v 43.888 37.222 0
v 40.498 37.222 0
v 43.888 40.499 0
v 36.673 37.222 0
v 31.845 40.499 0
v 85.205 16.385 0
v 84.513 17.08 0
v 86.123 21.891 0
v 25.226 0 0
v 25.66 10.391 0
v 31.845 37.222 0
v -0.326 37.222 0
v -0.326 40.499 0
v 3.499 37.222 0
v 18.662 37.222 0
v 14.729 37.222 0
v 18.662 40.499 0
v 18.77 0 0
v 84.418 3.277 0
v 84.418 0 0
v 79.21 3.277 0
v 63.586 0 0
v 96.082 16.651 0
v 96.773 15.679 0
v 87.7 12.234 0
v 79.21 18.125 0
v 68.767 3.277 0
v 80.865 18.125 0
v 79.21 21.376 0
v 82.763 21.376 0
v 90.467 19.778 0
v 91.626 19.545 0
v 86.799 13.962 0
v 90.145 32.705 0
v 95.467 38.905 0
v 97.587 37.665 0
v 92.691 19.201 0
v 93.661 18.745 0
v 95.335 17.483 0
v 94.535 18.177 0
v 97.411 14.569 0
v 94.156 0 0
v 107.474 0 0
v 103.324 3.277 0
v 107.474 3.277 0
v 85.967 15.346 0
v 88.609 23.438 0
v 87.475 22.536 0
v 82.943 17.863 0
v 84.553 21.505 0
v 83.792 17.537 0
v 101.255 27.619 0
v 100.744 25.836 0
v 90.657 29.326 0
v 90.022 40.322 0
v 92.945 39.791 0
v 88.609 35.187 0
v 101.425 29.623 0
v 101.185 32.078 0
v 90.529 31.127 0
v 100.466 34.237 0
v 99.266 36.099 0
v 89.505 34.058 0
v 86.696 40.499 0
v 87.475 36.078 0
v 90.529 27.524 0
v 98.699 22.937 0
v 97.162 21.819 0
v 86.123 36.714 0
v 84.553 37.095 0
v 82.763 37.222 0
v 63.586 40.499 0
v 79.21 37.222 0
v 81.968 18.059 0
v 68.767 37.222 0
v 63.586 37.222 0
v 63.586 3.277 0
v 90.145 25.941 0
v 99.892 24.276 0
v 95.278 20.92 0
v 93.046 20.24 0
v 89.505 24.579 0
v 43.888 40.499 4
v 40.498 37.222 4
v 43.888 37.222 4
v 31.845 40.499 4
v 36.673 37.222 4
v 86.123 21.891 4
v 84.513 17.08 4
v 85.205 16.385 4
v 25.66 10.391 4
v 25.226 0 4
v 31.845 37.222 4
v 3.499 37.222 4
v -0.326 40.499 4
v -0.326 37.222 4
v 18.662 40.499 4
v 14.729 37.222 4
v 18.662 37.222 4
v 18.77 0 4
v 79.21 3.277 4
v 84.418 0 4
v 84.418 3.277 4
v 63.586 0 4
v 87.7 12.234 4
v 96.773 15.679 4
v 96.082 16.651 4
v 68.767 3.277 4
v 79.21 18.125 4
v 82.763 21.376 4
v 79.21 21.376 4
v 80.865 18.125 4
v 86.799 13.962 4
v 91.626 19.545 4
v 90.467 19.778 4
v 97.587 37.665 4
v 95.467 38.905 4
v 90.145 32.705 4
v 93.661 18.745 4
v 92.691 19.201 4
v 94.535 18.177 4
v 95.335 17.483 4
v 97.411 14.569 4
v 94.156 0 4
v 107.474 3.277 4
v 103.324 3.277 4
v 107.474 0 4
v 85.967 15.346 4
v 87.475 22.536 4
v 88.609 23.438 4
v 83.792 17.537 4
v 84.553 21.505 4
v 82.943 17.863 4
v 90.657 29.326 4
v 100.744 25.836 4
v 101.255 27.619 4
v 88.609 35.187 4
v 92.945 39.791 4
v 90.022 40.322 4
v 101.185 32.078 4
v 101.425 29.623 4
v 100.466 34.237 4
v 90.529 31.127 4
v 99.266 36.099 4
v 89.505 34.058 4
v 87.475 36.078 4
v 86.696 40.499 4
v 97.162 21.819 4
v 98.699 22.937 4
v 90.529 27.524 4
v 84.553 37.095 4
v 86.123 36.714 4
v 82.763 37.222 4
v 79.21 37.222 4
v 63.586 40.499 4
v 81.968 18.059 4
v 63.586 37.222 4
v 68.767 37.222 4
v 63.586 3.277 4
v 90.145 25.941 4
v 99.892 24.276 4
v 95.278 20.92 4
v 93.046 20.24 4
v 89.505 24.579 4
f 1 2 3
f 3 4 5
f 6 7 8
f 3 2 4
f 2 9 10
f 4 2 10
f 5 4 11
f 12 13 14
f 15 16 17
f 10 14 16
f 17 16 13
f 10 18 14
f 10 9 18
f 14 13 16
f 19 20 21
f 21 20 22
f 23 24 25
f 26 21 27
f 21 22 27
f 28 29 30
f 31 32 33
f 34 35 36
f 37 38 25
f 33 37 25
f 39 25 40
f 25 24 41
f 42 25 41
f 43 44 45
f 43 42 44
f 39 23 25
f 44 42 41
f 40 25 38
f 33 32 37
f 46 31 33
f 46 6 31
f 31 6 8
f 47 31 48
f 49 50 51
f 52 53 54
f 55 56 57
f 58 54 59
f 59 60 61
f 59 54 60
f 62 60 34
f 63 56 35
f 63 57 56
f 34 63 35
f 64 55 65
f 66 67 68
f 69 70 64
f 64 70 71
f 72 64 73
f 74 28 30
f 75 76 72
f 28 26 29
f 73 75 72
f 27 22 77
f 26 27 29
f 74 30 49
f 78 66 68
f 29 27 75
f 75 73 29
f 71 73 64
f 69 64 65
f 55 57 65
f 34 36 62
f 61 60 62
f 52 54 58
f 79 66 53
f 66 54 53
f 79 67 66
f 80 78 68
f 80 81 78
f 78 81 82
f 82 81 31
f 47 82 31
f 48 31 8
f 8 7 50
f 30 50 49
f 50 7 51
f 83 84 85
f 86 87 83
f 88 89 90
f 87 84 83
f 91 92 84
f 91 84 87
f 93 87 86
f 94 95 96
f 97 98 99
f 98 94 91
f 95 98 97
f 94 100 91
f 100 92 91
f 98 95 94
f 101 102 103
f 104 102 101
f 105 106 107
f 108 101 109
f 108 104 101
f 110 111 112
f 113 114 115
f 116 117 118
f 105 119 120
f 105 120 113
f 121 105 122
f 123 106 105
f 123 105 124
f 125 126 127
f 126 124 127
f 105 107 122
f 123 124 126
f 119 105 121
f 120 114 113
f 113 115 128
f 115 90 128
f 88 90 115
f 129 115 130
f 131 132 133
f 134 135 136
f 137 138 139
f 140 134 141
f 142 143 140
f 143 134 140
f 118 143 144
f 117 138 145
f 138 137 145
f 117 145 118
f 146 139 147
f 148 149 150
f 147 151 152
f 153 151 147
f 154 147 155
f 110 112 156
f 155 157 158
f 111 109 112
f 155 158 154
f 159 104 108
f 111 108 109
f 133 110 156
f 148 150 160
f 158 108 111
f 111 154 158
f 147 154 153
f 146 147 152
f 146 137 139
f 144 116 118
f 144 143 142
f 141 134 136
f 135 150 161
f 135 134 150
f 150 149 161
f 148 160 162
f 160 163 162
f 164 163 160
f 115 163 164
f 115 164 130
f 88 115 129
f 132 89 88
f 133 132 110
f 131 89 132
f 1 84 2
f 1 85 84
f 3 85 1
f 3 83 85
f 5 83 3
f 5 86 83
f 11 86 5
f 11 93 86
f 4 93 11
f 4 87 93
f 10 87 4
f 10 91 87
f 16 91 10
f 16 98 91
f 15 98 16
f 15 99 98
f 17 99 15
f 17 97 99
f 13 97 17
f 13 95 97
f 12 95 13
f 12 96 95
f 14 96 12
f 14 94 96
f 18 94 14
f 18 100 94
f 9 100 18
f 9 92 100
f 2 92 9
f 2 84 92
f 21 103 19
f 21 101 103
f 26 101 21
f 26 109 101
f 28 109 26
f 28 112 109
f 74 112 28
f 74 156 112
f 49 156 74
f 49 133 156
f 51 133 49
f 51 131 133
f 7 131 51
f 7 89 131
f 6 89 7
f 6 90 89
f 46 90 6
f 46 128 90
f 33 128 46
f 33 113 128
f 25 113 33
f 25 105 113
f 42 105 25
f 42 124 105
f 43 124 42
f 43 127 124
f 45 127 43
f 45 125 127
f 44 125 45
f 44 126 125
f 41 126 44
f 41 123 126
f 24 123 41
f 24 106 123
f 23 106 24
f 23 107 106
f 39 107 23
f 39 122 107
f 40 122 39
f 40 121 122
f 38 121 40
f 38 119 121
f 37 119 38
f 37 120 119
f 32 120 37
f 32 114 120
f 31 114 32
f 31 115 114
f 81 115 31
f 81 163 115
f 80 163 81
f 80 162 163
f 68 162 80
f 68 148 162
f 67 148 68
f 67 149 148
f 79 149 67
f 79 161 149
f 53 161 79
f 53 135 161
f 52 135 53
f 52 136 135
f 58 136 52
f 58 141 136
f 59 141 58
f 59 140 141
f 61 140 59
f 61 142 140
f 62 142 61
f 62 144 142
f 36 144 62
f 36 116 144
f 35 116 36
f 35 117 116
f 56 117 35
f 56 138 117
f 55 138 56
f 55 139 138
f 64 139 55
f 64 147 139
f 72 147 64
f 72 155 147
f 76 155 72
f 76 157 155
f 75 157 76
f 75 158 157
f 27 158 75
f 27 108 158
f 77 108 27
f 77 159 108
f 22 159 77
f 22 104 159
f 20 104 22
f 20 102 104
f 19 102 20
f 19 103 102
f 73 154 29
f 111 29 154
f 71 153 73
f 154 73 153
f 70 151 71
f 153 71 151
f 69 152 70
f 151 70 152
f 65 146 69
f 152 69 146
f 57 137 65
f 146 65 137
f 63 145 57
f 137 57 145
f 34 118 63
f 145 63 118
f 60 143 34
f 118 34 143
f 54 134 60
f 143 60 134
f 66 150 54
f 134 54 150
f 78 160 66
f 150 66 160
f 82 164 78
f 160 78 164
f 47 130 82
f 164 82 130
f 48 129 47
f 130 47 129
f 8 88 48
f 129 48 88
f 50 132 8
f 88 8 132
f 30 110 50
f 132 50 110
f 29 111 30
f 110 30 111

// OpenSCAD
linear_extrude(height = 4){
    text("V R", font = "Garamond:style=Bold", size = 40);
}
